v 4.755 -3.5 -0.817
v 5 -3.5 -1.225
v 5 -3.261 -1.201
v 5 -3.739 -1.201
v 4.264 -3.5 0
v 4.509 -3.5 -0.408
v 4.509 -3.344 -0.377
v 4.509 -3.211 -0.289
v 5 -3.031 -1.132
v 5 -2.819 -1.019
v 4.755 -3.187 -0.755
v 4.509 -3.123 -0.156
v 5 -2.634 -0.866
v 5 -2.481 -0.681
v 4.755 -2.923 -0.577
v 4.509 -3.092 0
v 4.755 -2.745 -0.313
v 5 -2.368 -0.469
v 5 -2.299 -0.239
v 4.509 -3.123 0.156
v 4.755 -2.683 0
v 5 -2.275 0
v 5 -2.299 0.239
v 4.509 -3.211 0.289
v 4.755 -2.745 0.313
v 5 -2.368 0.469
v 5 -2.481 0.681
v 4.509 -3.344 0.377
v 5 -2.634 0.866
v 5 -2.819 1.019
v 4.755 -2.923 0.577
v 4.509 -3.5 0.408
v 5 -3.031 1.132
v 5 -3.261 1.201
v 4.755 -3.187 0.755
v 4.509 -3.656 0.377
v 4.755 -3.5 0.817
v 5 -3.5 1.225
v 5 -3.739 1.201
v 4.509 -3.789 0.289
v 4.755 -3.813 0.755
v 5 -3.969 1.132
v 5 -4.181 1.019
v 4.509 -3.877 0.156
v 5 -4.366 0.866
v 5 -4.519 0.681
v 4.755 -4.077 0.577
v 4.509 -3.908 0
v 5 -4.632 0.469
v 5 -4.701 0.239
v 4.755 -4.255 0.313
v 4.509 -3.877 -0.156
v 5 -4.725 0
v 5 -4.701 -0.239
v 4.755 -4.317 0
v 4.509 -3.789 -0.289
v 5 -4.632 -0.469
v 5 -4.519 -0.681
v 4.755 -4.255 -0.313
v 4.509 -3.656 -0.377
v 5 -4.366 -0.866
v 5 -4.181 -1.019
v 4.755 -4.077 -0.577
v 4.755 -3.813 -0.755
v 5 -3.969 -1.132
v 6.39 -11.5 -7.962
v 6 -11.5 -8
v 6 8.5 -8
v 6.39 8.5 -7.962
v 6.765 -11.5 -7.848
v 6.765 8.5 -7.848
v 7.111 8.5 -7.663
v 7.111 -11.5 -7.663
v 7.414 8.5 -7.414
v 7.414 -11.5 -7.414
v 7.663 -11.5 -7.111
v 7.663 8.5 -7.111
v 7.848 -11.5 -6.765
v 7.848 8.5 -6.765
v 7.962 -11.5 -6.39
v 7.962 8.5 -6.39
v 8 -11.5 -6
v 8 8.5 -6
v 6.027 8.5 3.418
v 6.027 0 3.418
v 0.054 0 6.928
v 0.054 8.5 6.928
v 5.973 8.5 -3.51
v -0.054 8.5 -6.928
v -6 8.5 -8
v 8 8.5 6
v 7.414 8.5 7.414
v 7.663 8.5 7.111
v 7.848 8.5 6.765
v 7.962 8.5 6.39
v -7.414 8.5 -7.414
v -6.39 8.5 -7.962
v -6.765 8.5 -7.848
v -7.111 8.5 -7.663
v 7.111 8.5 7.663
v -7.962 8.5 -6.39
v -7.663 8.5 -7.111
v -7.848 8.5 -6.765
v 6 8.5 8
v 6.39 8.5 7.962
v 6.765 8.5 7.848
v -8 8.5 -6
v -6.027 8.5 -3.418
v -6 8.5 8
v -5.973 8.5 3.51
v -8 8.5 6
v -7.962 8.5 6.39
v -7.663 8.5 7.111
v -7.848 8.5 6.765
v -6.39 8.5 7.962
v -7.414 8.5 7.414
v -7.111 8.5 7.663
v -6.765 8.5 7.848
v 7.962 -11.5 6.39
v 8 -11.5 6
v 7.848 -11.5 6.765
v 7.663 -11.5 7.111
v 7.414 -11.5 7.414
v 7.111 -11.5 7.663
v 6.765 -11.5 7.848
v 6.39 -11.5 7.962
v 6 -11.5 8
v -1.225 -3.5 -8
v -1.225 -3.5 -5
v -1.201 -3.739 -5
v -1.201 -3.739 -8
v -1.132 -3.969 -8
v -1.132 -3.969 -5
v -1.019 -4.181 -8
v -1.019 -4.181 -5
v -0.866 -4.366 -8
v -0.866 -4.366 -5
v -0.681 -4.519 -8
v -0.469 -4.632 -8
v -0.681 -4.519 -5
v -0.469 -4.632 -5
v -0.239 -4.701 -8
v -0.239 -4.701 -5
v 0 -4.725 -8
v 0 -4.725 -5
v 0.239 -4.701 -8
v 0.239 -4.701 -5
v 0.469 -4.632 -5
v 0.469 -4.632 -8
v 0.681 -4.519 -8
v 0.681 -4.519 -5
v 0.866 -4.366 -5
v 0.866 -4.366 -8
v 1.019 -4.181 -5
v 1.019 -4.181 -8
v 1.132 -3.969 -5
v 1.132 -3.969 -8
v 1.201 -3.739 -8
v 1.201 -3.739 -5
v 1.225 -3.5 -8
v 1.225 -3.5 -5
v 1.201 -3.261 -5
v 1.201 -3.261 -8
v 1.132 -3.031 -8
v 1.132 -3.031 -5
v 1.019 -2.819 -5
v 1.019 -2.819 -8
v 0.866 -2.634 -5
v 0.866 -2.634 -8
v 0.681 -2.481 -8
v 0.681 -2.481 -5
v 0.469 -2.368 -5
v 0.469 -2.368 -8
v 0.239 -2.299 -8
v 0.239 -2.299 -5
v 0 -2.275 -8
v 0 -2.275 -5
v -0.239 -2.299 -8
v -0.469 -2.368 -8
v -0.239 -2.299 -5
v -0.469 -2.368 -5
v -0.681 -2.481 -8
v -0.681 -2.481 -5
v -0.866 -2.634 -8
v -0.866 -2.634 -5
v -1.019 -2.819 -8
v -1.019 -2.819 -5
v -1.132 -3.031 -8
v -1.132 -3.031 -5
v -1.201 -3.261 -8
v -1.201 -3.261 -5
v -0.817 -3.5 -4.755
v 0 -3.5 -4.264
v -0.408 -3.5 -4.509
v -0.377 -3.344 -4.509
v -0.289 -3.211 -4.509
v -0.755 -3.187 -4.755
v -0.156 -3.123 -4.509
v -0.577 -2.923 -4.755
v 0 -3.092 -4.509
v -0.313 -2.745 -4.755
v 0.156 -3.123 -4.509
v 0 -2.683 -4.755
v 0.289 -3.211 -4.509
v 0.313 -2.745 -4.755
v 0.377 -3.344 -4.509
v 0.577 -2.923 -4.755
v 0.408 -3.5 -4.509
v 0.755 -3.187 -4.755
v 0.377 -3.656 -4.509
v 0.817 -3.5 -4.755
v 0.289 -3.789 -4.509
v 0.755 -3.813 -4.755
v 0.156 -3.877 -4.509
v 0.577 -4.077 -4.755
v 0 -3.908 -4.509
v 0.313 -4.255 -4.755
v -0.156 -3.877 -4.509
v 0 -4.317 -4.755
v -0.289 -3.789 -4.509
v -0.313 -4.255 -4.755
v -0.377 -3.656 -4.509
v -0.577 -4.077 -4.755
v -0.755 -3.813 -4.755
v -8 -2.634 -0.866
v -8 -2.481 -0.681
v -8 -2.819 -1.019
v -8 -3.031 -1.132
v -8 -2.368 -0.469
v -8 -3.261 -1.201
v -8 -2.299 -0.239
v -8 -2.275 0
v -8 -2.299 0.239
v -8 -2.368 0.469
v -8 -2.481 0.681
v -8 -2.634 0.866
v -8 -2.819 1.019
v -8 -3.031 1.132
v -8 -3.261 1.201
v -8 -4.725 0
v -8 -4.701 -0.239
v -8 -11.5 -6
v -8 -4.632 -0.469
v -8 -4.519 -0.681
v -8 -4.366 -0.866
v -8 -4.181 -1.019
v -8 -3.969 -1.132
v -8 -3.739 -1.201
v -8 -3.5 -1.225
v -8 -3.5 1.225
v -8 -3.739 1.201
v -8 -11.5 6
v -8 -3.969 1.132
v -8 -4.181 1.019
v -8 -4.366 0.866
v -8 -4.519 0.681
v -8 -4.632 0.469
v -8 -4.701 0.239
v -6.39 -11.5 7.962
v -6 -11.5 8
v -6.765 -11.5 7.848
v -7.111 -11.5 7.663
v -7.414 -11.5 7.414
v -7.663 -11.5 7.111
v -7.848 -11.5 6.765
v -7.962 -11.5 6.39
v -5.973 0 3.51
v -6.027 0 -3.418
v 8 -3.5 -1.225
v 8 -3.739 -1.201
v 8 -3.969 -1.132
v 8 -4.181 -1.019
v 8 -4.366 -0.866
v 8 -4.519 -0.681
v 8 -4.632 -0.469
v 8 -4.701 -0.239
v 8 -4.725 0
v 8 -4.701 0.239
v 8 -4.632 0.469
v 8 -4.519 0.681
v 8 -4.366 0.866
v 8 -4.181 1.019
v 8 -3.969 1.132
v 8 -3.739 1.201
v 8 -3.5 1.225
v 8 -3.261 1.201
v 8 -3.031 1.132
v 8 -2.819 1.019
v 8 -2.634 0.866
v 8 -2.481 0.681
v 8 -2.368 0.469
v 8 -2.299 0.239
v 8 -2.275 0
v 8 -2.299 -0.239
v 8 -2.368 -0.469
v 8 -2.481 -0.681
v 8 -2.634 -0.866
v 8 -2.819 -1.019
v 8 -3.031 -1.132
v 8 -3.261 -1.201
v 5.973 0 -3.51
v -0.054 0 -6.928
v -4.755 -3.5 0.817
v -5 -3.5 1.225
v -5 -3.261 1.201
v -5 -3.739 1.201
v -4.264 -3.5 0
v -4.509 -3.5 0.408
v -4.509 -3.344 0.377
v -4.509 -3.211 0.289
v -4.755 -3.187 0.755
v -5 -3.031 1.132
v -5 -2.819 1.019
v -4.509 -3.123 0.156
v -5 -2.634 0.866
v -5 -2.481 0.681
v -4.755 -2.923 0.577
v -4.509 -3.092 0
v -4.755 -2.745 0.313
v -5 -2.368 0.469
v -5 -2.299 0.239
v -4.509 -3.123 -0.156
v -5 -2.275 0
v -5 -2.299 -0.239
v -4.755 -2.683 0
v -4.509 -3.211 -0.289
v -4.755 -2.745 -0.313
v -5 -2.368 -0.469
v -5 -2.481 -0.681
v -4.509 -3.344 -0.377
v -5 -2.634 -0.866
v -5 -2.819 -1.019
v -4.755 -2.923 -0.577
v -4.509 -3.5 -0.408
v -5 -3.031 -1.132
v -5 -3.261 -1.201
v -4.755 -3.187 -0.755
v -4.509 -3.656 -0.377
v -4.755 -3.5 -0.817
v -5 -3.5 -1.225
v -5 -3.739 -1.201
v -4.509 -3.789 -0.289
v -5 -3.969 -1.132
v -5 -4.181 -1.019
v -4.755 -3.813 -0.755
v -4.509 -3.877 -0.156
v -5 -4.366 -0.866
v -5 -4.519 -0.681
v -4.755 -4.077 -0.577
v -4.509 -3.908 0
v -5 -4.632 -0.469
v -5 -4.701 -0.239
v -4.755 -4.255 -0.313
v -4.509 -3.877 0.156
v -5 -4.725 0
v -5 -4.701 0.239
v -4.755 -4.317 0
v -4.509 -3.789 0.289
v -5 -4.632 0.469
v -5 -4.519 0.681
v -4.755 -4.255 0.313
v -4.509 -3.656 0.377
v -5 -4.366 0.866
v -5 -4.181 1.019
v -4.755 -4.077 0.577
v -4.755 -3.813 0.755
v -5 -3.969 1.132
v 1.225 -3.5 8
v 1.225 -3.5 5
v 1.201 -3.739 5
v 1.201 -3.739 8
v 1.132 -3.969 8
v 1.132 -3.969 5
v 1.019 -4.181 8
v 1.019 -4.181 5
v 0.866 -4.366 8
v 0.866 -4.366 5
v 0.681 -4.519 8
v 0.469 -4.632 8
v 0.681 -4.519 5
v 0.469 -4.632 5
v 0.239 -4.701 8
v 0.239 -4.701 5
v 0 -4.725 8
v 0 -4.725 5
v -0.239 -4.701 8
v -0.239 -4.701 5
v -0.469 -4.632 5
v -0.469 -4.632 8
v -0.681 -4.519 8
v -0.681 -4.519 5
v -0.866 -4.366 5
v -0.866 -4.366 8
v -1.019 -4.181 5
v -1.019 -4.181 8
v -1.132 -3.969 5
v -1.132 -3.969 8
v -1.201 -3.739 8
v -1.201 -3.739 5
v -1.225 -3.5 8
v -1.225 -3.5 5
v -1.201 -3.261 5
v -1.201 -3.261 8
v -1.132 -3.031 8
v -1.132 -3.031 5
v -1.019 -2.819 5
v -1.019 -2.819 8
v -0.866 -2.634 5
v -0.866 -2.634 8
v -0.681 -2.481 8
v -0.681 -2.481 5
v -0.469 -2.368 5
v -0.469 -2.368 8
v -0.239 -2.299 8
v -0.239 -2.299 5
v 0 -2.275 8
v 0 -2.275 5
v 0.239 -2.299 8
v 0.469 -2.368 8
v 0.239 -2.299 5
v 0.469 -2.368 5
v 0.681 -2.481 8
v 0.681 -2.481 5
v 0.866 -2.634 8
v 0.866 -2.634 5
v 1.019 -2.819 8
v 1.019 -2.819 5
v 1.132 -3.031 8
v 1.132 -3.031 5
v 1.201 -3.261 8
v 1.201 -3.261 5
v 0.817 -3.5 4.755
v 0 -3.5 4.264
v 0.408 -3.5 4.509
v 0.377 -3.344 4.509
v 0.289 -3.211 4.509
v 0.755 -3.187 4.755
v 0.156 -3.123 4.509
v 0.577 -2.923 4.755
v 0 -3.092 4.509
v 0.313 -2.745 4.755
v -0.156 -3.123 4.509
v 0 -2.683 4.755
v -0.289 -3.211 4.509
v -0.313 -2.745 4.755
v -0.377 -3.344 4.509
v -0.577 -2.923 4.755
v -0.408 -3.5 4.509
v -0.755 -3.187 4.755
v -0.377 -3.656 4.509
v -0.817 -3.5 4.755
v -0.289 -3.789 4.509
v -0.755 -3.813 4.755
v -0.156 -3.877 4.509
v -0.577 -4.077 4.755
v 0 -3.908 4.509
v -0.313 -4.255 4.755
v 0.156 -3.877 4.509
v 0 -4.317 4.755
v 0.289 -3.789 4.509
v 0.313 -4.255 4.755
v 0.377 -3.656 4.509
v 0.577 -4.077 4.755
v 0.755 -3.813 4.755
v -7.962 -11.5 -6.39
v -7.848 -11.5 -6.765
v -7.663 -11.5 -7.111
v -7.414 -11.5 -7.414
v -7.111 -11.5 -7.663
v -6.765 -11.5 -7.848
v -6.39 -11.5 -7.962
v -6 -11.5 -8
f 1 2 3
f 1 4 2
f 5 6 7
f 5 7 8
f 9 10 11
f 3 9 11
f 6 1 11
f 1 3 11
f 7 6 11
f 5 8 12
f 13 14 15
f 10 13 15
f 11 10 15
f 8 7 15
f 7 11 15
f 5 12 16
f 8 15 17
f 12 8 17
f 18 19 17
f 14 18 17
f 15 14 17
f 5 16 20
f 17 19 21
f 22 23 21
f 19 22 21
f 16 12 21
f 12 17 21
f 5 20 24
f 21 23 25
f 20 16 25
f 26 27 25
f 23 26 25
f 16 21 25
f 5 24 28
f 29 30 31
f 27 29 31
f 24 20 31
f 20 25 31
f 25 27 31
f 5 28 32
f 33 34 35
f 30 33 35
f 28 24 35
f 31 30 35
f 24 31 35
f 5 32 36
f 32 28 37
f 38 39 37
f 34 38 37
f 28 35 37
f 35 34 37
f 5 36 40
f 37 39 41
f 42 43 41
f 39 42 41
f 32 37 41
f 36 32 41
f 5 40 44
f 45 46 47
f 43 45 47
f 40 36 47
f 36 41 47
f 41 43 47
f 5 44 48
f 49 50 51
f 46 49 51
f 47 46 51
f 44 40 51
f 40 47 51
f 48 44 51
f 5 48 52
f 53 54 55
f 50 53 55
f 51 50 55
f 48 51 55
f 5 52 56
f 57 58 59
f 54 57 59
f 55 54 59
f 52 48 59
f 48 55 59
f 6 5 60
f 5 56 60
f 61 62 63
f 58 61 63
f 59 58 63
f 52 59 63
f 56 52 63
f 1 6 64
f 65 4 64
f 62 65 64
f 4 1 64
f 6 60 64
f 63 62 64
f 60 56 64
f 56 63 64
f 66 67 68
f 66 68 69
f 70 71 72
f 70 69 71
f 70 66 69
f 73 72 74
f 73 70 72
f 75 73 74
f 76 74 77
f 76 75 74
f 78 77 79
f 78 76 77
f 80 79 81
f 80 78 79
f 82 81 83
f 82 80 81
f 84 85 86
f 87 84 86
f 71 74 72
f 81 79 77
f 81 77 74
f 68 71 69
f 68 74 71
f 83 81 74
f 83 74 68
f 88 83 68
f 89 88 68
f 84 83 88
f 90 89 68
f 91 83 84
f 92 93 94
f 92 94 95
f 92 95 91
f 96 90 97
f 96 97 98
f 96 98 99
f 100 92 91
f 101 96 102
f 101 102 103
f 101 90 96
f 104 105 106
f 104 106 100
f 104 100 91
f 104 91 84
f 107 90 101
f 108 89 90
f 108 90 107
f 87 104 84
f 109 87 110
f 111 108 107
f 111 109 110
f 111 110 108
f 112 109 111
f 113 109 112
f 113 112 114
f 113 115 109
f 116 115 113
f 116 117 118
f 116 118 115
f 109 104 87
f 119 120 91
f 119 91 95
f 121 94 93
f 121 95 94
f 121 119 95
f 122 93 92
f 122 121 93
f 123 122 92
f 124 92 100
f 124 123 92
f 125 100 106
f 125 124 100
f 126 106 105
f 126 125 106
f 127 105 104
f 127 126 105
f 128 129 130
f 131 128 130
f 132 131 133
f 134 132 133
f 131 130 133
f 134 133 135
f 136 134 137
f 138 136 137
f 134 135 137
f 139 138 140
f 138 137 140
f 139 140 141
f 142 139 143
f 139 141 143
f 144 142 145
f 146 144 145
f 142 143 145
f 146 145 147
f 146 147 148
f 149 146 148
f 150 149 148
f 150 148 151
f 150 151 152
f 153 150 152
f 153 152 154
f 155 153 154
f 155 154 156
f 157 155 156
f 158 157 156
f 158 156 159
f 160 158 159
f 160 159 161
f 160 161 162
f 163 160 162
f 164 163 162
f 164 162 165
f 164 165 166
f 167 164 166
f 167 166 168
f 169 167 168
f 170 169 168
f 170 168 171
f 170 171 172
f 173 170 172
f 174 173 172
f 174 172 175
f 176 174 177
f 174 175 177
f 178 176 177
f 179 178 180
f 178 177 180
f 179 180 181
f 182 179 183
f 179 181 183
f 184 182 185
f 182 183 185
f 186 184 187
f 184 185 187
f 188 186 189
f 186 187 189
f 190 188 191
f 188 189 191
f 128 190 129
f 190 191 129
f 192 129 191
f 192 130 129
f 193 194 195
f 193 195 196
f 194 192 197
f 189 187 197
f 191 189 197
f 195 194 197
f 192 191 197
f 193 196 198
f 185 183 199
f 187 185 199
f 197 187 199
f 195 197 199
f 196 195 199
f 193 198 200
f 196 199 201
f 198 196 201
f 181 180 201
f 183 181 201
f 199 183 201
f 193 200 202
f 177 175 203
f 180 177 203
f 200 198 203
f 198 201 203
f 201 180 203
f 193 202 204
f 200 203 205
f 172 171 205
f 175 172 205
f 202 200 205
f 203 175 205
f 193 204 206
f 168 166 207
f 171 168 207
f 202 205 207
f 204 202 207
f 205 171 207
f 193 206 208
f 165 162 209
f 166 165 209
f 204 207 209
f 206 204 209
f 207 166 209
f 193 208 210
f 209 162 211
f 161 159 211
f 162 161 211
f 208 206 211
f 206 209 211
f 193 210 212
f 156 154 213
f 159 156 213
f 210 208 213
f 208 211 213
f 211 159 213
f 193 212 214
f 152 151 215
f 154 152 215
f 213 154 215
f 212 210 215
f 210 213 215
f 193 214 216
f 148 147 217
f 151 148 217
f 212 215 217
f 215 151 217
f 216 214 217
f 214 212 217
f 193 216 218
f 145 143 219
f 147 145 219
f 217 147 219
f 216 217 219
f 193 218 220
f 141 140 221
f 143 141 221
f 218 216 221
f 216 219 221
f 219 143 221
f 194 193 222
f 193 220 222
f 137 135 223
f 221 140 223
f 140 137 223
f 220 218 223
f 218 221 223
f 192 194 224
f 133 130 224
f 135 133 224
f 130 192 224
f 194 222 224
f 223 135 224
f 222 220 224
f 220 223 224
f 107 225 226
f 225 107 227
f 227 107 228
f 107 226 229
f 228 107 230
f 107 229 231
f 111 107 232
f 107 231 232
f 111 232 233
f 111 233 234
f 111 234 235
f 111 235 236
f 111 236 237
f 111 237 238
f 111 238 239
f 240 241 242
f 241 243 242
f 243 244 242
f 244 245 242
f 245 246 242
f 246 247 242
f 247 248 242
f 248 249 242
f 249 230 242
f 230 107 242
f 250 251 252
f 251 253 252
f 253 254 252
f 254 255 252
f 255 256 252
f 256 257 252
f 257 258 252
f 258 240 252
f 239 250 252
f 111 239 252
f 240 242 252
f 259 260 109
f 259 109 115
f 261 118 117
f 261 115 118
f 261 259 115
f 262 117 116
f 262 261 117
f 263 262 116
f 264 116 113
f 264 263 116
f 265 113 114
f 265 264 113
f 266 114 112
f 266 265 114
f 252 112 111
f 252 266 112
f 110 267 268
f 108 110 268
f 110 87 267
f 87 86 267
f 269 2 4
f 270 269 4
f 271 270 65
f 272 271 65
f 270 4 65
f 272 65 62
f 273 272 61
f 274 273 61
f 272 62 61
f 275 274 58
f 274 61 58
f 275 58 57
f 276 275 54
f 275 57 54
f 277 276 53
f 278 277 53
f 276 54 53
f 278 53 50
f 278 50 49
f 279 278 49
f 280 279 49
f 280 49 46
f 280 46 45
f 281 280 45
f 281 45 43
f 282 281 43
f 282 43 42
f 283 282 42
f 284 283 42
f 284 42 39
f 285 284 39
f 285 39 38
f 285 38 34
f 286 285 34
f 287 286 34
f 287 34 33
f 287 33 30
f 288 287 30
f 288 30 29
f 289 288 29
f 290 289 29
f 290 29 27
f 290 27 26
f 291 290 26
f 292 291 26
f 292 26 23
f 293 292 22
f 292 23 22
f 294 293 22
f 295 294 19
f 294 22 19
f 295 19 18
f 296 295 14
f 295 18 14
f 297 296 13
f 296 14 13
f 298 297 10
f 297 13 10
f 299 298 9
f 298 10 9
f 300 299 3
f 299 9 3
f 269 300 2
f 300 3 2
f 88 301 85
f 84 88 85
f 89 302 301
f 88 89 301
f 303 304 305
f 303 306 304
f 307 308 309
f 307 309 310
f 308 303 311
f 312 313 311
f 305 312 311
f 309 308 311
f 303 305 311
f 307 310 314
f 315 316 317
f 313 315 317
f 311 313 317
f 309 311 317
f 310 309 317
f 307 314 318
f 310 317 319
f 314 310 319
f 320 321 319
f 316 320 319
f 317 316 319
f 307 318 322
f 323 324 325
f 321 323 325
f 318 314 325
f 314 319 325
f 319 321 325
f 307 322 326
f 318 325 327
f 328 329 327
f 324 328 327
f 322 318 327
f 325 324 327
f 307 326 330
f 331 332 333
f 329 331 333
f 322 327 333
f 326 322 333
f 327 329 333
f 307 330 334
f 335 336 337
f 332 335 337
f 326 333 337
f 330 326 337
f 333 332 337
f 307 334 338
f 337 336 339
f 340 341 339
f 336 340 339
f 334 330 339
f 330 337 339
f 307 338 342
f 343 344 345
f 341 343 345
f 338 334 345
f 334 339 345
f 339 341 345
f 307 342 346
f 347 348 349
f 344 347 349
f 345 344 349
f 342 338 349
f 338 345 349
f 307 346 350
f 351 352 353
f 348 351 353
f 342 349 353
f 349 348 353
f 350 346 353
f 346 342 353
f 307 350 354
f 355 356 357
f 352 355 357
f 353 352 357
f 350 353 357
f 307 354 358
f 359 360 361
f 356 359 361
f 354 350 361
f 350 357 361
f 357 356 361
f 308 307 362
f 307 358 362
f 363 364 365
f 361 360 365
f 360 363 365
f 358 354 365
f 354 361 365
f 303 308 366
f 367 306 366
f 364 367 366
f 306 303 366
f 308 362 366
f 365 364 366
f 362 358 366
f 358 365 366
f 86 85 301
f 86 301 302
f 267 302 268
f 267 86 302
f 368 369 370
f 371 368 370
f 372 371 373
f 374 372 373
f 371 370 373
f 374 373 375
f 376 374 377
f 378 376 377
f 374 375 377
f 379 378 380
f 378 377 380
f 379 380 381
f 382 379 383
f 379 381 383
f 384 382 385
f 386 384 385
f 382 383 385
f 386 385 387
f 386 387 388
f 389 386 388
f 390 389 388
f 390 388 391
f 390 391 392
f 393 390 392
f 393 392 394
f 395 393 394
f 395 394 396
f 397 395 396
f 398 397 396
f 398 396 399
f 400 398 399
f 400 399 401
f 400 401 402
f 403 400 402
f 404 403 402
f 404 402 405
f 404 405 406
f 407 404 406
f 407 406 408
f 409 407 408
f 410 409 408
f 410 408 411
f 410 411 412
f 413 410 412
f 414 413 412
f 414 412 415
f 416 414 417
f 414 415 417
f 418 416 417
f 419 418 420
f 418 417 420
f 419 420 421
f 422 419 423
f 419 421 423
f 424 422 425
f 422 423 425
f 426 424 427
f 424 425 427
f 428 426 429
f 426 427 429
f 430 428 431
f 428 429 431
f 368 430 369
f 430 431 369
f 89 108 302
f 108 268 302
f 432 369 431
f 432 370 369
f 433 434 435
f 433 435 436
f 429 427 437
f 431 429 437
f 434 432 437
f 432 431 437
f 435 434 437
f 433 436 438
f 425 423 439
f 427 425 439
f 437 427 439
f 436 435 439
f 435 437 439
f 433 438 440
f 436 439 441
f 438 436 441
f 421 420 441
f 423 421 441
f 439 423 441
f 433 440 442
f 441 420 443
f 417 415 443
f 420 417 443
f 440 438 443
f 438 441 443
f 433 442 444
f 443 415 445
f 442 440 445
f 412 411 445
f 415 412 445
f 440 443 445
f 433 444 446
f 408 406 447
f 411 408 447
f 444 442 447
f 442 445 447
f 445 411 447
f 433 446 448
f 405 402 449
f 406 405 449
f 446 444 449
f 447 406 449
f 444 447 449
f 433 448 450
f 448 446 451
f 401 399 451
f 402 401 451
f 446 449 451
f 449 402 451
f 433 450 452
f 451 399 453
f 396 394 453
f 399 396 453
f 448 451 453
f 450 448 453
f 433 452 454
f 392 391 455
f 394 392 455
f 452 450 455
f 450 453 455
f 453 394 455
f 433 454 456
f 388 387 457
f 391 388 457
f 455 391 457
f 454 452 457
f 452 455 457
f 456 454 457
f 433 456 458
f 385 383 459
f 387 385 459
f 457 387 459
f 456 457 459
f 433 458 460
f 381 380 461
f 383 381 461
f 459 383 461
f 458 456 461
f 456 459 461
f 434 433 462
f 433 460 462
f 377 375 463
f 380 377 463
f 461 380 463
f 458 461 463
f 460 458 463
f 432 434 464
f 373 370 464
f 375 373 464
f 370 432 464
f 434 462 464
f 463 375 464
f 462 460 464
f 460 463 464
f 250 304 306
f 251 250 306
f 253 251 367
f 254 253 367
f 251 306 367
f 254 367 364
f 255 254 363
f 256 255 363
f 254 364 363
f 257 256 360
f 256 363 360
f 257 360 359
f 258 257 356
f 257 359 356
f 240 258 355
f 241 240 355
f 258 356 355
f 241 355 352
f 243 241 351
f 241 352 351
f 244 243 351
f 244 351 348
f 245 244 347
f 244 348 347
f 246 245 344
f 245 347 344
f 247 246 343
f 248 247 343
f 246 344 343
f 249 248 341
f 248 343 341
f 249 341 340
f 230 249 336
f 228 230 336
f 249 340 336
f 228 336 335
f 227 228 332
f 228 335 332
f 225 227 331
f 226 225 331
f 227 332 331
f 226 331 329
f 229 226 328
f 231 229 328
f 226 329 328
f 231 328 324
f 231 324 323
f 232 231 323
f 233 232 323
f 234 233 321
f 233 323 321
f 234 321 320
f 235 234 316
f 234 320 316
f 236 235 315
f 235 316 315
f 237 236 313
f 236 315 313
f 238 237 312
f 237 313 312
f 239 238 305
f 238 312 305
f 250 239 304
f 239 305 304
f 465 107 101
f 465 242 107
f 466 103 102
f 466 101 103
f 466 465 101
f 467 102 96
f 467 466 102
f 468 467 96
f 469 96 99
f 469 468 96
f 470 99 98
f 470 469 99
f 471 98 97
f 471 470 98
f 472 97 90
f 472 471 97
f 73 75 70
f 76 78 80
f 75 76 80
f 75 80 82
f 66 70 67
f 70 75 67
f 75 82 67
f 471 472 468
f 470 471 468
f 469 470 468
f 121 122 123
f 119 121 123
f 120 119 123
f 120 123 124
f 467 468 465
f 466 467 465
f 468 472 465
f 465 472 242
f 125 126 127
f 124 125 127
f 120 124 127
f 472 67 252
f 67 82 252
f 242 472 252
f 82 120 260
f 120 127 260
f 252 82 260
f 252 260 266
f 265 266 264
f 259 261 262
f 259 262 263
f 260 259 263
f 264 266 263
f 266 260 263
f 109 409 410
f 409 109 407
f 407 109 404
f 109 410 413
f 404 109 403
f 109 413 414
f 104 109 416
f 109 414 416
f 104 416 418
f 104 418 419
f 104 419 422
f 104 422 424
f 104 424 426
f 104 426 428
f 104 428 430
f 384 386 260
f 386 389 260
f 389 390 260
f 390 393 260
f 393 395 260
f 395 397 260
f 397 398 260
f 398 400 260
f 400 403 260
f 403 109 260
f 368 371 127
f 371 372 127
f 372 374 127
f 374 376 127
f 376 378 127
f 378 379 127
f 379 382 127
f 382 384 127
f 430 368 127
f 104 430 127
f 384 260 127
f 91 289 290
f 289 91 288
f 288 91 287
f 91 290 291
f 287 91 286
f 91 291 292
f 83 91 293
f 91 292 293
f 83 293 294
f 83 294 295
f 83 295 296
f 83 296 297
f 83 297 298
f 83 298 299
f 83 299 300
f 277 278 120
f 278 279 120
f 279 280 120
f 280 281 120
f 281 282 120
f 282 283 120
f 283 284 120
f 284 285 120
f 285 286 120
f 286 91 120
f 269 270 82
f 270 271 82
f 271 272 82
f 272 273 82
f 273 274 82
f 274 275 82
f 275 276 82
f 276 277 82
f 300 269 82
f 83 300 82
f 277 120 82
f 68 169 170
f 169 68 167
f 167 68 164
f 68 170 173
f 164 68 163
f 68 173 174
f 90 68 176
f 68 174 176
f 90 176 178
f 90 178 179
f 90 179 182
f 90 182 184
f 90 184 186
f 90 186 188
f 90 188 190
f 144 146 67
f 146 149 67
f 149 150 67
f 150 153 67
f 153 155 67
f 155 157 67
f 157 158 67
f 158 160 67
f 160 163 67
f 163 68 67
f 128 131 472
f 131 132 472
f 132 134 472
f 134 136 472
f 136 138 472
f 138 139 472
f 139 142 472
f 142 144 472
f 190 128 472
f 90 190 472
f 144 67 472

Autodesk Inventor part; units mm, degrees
ref_plane "YZ Plane" through (0, 0, 0) normal (1, 0, 0) x (0, 1, 0)
ref_plane "XZ Plane" through (0, 0, 0) normal (0, 1, 0) x (-1, 0, 0)
ref_plane "XY Plane" through (0, 0, 0) normal (0, 0, 1) x (1, 0, 0)
sketch "Sketch1" plane through (0, 0, 0) normal (0, 1, 0) x (-1, 0, 0)
  line L0 (0.0535, -6.928) -> (-5.9731, -3.5103)
  line L1 (-5.9731, -3.5103) -> (-6.0266, 3.4177)
  line L2 (-6.0266, 3.4177) -> (-0.0535, 6.928)
  line L3 (-0.0535, 6.928) -> (5.9731, 3.5103)
  line L4 (5.9731, 3.5103) -> (6.0266, -3.4177)
  line L5 (6.0266, -3.4177) -> (0.0535, -6.928)
  line L6 (6, 8) -> (-6, 8)
  line L7 (-8, 6) -> (-8, -6)
  line L8 (-6, -8) -> (6, -8)
  line L9 (8, -6) -> (8, 6)
  line L10 (8, 8) -> (-8, -8) construction
  line L11 (-8, 8) -> (8, -8) construction
  arc A0 (8, 6) -> (6, 8) centre (6, 6) ccw
  arc A1 (-6, 8) -> (-8, 6) centre (-6, 6) ccw
  arc A2 (-8, -6) -> (-6, -8) centre (-6, -6) ccw
  arc A3 (6, -8) -> (8, -6) centre (6, -6) ccw
  point P0 (0, 0)
  point P1 (0, 0)
  dimension "d0" = 12
  dimension "d1" = 16
  dimension "d2" = 16
  dimension "d7" = 2
extrude "Extrusion1" add sketch "Sketch1" along normal blind 8.5
extrude "Extrusion2" add sketch "Sketch1" against normal blind 11.5 contours L0 L1 L2 L3 L4 L5 | A0 L9 A3 L8 A2 L7 A1 L6
sketch "Sketch2" plane through (8, 8.5, 6) normal (1, 0, 0) x (0, 0, -1)
  line L0 (12, -20) -> (12, 0) projected
  line L1 (0, 0) -> (12, 0) projected
  line L2 (0, -20) -> (0, 0) projected
  line L3 (12, -20) -> (0, -20) projected
  point P0 (6, -8.5)
  point P1 (6, -12)
  point P2 (6, -20)
  dimension "d8" = 12
hole "Hole1" at (8, -3.5, 0) direction (-1, 0, 0) diameter 2.45 depth 3 tip angle 118
pattern_circular "Circular Pattern1" count 4 over 360 about axis through (0, -10, 0) along (0, 1, 0) of "Hole1"
properties part number "couplingload"
